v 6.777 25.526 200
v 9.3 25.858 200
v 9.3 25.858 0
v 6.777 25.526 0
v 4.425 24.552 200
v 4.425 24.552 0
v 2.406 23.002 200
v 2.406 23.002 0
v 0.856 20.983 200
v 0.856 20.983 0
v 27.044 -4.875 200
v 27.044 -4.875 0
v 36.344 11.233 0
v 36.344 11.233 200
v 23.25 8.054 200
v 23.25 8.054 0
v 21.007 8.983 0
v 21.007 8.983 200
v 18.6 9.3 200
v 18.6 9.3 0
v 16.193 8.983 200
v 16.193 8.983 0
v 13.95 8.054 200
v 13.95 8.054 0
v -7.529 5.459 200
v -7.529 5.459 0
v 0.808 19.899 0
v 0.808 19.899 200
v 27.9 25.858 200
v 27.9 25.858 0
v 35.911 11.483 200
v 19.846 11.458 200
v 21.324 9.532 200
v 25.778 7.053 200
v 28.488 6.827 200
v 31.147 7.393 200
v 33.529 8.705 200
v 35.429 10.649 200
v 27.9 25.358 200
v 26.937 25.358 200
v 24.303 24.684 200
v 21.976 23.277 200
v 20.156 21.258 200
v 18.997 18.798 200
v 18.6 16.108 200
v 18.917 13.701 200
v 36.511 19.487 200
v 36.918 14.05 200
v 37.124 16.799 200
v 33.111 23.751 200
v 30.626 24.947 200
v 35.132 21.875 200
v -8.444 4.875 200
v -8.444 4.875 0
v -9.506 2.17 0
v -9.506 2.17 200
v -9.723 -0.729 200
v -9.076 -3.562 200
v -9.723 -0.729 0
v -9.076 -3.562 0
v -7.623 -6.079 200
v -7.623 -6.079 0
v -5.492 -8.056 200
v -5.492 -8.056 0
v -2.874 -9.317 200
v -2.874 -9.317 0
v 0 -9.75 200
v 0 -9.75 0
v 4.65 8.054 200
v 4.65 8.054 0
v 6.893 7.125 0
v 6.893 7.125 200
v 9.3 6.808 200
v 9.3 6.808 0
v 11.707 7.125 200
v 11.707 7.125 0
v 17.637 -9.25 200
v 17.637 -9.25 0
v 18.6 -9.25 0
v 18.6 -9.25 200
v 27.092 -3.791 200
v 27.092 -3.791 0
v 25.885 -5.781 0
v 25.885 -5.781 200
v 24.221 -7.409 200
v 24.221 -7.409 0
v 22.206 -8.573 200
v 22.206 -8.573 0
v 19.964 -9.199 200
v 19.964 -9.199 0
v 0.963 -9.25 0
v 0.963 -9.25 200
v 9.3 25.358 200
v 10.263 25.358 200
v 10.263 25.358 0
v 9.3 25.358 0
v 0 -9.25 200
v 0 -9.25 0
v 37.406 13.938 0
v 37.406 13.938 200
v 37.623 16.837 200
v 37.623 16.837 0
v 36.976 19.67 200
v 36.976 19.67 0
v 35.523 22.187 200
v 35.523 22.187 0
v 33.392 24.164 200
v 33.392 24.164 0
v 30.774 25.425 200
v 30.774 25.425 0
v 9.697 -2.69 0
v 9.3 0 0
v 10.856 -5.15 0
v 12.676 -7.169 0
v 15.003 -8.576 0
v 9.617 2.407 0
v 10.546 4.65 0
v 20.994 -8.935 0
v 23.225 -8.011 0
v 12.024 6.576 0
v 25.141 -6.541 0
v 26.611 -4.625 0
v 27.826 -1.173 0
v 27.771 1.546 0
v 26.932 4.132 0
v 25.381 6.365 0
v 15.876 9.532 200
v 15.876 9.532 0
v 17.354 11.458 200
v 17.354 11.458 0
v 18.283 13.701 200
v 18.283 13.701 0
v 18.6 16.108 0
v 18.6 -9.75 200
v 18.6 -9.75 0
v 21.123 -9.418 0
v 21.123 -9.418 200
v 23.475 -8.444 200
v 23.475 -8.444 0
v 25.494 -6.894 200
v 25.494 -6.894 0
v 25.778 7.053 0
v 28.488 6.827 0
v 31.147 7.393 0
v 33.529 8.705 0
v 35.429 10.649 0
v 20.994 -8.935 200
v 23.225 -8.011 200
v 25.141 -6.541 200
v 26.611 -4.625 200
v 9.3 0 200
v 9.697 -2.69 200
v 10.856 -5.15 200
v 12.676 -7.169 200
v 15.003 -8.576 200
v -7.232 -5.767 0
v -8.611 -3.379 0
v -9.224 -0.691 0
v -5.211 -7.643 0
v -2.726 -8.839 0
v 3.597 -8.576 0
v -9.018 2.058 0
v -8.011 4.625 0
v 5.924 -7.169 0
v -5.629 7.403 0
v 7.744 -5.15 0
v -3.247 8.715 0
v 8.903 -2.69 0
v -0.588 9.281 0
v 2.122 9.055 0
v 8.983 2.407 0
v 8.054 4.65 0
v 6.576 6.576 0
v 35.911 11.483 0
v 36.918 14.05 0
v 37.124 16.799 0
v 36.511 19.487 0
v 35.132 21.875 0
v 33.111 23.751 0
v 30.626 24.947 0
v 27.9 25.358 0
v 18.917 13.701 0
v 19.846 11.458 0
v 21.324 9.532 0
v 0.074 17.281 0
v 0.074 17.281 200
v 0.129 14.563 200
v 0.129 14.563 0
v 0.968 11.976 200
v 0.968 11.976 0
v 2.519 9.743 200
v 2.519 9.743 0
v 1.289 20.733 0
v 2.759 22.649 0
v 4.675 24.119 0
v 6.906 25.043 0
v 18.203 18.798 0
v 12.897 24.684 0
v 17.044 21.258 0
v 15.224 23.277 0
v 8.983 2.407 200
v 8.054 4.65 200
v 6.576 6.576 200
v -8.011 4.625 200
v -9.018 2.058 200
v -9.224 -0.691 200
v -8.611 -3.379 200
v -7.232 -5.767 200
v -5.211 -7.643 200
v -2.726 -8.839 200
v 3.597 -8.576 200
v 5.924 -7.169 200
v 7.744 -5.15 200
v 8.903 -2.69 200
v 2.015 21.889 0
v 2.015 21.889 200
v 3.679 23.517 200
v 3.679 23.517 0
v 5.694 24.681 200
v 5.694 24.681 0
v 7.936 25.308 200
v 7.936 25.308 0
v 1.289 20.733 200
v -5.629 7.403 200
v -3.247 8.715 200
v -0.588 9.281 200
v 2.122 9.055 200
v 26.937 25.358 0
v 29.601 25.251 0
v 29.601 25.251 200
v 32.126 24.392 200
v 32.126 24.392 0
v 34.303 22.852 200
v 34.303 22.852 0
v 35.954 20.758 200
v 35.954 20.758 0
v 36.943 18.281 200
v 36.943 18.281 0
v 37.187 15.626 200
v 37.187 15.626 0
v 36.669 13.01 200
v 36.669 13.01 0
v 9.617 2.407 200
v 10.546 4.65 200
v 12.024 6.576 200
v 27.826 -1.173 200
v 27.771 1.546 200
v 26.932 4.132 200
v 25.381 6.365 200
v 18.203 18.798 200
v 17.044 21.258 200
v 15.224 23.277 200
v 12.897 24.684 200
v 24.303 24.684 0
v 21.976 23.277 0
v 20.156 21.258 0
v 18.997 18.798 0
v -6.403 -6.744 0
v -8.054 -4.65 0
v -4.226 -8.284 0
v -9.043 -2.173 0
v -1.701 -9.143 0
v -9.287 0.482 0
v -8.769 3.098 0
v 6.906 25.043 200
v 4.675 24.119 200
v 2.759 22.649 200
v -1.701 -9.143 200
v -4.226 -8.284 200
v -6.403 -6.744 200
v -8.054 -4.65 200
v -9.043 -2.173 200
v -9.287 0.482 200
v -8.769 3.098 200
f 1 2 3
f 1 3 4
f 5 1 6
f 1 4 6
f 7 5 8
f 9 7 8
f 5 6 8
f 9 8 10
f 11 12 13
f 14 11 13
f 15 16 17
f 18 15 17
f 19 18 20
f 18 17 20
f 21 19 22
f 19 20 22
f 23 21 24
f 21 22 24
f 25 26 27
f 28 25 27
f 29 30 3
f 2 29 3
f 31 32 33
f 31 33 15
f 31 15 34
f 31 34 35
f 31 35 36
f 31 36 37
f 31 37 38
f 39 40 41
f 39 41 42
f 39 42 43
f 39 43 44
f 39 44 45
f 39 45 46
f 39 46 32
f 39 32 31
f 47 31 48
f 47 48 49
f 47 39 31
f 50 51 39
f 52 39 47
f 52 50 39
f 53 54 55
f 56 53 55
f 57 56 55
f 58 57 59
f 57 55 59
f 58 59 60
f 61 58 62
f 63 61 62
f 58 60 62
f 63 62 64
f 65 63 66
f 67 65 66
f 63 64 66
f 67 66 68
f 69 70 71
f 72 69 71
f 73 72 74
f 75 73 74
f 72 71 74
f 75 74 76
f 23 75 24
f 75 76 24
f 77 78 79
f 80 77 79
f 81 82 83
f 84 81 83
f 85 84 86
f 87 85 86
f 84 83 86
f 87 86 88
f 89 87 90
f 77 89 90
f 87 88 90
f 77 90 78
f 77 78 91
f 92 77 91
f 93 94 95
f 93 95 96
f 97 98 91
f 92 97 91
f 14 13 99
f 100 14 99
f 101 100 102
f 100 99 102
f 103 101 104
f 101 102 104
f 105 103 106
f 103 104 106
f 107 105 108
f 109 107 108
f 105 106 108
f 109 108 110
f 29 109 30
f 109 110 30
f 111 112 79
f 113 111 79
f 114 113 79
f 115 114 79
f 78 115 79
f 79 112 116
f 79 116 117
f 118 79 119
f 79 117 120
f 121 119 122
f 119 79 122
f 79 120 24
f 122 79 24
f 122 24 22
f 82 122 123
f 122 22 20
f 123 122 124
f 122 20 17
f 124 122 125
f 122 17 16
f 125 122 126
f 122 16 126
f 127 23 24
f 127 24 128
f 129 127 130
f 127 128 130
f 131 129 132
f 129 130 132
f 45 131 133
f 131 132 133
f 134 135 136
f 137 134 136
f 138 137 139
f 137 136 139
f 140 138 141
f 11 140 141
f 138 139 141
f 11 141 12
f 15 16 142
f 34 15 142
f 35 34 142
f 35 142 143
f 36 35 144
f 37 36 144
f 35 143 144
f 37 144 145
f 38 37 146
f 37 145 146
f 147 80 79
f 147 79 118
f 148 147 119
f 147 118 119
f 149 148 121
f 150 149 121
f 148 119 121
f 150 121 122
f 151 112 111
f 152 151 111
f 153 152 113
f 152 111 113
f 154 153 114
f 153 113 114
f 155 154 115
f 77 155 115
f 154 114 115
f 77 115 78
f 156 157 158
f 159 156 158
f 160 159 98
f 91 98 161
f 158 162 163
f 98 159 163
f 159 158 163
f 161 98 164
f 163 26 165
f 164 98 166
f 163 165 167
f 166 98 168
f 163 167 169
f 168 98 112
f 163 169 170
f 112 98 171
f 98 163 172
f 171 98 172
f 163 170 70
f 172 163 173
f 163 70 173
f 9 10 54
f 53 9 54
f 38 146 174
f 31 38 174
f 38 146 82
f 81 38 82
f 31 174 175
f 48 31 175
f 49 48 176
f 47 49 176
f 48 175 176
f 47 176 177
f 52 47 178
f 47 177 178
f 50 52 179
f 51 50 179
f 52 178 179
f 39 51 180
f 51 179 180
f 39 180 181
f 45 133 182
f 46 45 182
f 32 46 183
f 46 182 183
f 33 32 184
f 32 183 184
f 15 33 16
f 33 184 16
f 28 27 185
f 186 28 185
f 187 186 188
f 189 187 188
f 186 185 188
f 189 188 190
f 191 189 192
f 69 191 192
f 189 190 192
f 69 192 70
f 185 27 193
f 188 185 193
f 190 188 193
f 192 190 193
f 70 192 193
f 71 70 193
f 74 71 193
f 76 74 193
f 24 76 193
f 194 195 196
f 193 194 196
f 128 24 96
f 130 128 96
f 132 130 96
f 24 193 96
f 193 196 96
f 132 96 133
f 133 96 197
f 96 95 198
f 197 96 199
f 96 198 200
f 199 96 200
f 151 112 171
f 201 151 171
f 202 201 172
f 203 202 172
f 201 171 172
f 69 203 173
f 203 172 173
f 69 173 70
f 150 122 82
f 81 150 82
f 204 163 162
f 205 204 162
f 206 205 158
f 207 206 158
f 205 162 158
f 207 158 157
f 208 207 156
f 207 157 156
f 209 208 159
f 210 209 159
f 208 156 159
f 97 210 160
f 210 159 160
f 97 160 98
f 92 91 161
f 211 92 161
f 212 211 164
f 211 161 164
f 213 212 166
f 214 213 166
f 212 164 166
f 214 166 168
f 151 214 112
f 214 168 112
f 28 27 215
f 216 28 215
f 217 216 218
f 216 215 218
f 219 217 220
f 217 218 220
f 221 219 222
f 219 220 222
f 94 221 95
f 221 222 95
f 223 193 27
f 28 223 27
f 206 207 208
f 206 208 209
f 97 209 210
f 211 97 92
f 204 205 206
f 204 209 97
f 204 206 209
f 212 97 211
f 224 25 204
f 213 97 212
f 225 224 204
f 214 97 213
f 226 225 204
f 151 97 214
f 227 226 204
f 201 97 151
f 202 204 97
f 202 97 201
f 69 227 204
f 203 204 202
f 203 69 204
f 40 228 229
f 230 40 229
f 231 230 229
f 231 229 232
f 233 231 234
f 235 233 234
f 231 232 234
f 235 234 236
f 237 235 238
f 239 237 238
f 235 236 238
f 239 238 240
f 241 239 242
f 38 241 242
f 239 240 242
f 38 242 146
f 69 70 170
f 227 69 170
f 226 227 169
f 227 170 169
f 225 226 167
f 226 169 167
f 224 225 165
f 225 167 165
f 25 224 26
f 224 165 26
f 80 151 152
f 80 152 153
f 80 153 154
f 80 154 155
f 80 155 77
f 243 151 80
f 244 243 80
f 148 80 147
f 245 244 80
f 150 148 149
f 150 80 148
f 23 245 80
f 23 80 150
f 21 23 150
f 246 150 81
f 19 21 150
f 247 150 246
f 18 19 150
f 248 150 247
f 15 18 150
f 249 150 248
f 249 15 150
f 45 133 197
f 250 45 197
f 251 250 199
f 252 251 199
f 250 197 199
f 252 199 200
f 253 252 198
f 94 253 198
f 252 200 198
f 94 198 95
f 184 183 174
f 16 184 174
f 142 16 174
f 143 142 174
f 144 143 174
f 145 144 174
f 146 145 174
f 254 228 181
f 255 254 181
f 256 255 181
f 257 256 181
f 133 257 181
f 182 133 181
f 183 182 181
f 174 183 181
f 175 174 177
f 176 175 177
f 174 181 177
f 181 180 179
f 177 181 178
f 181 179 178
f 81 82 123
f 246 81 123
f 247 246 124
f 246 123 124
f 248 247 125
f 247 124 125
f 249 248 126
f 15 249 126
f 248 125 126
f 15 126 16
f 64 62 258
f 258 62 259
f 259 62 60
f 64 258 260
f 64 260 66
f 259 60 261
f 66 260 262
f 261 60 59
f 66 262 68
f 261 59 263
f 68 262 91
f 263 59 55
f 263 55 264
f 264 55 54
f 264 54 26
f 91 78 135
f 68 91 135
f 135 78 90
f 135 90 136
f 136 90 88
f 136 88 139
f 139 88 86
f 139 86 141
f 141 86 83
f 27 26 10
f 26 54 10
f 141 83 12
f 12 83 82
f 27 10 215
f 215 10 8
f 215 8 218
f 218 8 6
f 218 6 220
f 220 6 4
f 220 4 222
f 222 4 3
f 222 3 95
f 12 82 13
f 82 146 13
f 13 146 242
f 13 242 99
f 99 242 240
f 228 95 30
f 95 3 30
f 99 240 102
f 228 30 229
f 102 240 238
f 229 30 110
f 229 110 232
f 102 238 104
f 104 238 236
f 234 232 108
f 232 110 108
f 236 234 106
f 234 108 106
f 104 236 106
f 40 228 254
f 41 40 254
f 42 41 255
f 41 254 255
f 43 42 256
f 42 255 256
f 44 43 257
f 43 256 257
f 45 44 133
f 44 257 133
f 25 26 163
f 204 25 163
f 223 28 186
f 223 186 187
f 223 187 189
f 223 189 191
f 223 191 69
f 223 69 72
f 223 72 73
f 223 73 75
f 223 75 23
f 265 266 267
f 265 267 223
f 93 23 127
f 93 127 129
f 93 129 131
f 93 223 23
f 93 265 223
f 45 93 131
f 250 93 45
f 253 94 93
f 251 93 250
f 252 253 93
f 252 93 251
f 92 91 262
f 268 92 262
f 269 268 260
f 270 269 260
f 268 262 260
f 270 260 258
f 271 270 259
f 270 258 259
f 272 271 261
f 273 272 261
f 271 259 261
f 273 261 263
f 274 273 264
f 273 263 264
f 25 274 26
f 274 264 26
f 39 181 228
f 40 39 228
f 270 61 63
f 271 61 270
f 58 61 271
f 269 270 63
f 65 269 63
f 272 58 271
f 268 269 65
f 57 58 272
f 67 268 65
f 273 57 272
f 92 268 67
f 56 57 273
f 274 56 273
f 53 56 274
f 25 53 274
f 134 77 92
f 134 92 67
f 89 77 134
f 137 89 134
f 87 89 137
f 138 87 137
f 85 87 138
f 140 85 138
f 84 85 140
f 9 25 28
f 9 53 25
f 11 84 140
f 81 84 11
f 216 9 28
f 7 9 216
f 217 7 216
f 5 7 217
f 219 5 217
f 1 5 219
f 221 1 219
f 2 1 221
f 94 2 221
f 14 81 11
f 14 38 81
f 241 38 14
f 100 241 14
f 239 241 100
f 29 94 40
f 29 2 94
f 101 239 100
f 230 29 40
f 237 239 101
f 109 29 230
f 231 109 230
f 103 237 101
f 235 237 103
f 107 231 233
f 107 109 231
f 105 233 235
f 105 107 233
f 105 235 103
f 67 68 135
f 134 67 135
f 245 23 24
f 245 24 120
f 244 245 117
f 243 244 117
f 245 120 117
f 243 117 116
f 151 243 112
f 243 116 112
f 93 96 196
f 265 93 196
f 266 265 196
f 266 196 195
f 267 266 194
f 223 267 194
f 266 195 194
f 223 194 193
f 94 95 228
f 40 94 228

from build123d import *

# Parameters (mm, degrees)
EXTRUDE_1_DEPTH = 200


with BuildPart() as part:
    # Эскиз1 → Бобышка-Вытянуть1 (new body)
    with BuildSketch(Plane.XY):
        with BuildLine():
            Line((27.9, 25.85807251), (9.3, 25.85807251))
            ThreePointArc((9.3, 25.85807251), (4.425, 24.551820197), (0.856252313, 20.98307251))
            Line((0.856252313, 20.98307251), (-8.443747687, 4.875))
            ThreePointArc((-8.443747687, 4.875), (-8.443747687, -4.875), (0, -9.75))
            Line((0, -9.75), (18.6, -9.75))
            ThreePointArc((18.6, -9.75), (23.475, -8.443747687), (27.043747687, -4.875))
            Line((27.043747687, -4.875), (36.343747687, 11.23307251))
            ThreePointArc((36.343747687, 11.23307251), (36.343747687, 20.98307251), (27.9, 25.85807251))
        make_face()
        with BuildLine():
            ThreePointArc((0.807731008, 19.899031145), (4.65, 24.162108766), (10.263068014, 25.35807251))
            Line((10.263068014, 25.35807251), (26.936931986, 25.35807251))
            ThreePointArc((26.936931986, 25.35807251), (35.954036255, 20.75807251), (35.429200978, 10.649031145))
            Line((35.429200978, 10.649031145), (27.092268992, -3.790958634))
            ThreePointArc((27.092268992, -3.790958634), (23.25, -8.054036255), (17.636931986, -9.25))
            Line((17.636931986, -9.25), (0.963068014, -9.25))
            ThreePointArc((0.963068014, -9.25), (-8.054036255, -4.65), (-7.529200978, 5.459041366))
            Line((-7.529200978, 5.459041366), (0.807731008, 19.899031145))
        make_face(mode=Mode.SUBTRACT)
        with BuildLine():
            ThreePointArc((4.650000055, 8.054036223), (-1.938027107, 9.095826017), (-7.529200978, 5.459041366))
            Line((-7.529200978, 5.459041366), (-8.010734985, 4.625))
            ThreePointArc((-8.010734985, 4.625), (-8.010734985, -4.625), (0, -9.25))
            Line((0, -9.25), (0.963068014, -9.25))
            ThreePointArc((0.963068014, -9.25), (6.908202825, -6.22629374), (9.3, 0))
            ThreePointArc((9.3, 0), (8.054036271, 4.649999972), (4.650000055, 8.054036223))
        make_face()
        with BuildLine():
            ThreePointArc((23.250000012, 8.054036248), (18.599999943, 9.3), (13.949999888, 8.054036191))
            ThreePointArc((13.949999888, 8.054036191), (10.545963713, 4.649999944), (9.3, 0))
            ThreePointArc((9.3, 0), (11.691797175, -6.22629374), (17.636931986, -9.25))
            Line((17.636931986, -9.25), (18.6, -9.25))
            ThreePointArc((18.6, -9.25), (23.225, -8.010734985), (26.610734985, -4.625))
            Line((26.610734985, -4.625), (27.092268992, -3.790958634))
            ThreePointArc((27.092268992, -3.790958634), (27.446229965, 2.869532264), (23.250000012, 8.054036248))
        make_face()
        with BuildLine():
            Line((27.9, 25.35807251), (26.936931986, 25.35807251))
            ThreePointArc((26.936931986, 25.35807251), (20.991797175, 22.33436625), (18.6, 16.10807251))
            ThreePointArc((18.6, 16.10807251), (19.845963748, 11.458072504), (23.250000012, 8.054036248))
            ThreePointArc((23.250000012, 8.054036248), (29.838027145, 7.012246501), (35.429200978, 10.649031145))
            Line((35.429200978, 10.649031145), (35.910734985, 11.48307251))
            ThreePointArc((35.910734985, 11.48307251), (35.910734985, 20.73307251), (27.9, 25.35807251))
        make_face()
        with BuildLine():
            Line((10.263068014, 25.35807251), (9.3, 25.35807251))
            ThreePointArc((9.3, 25.35807251), (4.675, 24.118807495), (1.289265015, 20.73307251))
            Line((1.289265015, 20.73307251), (0.807731008, 19.899031145))
            ThreePointArc((0.807731008, 19.899031145), (0.453770047, 13.238540209), (4.650000055, 8.054036223))
            ThreePointArc((4.650000055, 8.054036223), (9.299999967, 6.80807251), (13.949999888, 8.054036191))
            ThreePointArc((13.949999888, 8.054036191), (17.354036223, 11.458072455), (18.6, 16.10807251))
            ThreePointArc((18.6, 16.10807251), (16.208202825, 22.33436625), (10.263068014, 25.35807251))
        make_face()
    extrude(amount=EXTRUDE_1_DEPTH)


solid = part.part
